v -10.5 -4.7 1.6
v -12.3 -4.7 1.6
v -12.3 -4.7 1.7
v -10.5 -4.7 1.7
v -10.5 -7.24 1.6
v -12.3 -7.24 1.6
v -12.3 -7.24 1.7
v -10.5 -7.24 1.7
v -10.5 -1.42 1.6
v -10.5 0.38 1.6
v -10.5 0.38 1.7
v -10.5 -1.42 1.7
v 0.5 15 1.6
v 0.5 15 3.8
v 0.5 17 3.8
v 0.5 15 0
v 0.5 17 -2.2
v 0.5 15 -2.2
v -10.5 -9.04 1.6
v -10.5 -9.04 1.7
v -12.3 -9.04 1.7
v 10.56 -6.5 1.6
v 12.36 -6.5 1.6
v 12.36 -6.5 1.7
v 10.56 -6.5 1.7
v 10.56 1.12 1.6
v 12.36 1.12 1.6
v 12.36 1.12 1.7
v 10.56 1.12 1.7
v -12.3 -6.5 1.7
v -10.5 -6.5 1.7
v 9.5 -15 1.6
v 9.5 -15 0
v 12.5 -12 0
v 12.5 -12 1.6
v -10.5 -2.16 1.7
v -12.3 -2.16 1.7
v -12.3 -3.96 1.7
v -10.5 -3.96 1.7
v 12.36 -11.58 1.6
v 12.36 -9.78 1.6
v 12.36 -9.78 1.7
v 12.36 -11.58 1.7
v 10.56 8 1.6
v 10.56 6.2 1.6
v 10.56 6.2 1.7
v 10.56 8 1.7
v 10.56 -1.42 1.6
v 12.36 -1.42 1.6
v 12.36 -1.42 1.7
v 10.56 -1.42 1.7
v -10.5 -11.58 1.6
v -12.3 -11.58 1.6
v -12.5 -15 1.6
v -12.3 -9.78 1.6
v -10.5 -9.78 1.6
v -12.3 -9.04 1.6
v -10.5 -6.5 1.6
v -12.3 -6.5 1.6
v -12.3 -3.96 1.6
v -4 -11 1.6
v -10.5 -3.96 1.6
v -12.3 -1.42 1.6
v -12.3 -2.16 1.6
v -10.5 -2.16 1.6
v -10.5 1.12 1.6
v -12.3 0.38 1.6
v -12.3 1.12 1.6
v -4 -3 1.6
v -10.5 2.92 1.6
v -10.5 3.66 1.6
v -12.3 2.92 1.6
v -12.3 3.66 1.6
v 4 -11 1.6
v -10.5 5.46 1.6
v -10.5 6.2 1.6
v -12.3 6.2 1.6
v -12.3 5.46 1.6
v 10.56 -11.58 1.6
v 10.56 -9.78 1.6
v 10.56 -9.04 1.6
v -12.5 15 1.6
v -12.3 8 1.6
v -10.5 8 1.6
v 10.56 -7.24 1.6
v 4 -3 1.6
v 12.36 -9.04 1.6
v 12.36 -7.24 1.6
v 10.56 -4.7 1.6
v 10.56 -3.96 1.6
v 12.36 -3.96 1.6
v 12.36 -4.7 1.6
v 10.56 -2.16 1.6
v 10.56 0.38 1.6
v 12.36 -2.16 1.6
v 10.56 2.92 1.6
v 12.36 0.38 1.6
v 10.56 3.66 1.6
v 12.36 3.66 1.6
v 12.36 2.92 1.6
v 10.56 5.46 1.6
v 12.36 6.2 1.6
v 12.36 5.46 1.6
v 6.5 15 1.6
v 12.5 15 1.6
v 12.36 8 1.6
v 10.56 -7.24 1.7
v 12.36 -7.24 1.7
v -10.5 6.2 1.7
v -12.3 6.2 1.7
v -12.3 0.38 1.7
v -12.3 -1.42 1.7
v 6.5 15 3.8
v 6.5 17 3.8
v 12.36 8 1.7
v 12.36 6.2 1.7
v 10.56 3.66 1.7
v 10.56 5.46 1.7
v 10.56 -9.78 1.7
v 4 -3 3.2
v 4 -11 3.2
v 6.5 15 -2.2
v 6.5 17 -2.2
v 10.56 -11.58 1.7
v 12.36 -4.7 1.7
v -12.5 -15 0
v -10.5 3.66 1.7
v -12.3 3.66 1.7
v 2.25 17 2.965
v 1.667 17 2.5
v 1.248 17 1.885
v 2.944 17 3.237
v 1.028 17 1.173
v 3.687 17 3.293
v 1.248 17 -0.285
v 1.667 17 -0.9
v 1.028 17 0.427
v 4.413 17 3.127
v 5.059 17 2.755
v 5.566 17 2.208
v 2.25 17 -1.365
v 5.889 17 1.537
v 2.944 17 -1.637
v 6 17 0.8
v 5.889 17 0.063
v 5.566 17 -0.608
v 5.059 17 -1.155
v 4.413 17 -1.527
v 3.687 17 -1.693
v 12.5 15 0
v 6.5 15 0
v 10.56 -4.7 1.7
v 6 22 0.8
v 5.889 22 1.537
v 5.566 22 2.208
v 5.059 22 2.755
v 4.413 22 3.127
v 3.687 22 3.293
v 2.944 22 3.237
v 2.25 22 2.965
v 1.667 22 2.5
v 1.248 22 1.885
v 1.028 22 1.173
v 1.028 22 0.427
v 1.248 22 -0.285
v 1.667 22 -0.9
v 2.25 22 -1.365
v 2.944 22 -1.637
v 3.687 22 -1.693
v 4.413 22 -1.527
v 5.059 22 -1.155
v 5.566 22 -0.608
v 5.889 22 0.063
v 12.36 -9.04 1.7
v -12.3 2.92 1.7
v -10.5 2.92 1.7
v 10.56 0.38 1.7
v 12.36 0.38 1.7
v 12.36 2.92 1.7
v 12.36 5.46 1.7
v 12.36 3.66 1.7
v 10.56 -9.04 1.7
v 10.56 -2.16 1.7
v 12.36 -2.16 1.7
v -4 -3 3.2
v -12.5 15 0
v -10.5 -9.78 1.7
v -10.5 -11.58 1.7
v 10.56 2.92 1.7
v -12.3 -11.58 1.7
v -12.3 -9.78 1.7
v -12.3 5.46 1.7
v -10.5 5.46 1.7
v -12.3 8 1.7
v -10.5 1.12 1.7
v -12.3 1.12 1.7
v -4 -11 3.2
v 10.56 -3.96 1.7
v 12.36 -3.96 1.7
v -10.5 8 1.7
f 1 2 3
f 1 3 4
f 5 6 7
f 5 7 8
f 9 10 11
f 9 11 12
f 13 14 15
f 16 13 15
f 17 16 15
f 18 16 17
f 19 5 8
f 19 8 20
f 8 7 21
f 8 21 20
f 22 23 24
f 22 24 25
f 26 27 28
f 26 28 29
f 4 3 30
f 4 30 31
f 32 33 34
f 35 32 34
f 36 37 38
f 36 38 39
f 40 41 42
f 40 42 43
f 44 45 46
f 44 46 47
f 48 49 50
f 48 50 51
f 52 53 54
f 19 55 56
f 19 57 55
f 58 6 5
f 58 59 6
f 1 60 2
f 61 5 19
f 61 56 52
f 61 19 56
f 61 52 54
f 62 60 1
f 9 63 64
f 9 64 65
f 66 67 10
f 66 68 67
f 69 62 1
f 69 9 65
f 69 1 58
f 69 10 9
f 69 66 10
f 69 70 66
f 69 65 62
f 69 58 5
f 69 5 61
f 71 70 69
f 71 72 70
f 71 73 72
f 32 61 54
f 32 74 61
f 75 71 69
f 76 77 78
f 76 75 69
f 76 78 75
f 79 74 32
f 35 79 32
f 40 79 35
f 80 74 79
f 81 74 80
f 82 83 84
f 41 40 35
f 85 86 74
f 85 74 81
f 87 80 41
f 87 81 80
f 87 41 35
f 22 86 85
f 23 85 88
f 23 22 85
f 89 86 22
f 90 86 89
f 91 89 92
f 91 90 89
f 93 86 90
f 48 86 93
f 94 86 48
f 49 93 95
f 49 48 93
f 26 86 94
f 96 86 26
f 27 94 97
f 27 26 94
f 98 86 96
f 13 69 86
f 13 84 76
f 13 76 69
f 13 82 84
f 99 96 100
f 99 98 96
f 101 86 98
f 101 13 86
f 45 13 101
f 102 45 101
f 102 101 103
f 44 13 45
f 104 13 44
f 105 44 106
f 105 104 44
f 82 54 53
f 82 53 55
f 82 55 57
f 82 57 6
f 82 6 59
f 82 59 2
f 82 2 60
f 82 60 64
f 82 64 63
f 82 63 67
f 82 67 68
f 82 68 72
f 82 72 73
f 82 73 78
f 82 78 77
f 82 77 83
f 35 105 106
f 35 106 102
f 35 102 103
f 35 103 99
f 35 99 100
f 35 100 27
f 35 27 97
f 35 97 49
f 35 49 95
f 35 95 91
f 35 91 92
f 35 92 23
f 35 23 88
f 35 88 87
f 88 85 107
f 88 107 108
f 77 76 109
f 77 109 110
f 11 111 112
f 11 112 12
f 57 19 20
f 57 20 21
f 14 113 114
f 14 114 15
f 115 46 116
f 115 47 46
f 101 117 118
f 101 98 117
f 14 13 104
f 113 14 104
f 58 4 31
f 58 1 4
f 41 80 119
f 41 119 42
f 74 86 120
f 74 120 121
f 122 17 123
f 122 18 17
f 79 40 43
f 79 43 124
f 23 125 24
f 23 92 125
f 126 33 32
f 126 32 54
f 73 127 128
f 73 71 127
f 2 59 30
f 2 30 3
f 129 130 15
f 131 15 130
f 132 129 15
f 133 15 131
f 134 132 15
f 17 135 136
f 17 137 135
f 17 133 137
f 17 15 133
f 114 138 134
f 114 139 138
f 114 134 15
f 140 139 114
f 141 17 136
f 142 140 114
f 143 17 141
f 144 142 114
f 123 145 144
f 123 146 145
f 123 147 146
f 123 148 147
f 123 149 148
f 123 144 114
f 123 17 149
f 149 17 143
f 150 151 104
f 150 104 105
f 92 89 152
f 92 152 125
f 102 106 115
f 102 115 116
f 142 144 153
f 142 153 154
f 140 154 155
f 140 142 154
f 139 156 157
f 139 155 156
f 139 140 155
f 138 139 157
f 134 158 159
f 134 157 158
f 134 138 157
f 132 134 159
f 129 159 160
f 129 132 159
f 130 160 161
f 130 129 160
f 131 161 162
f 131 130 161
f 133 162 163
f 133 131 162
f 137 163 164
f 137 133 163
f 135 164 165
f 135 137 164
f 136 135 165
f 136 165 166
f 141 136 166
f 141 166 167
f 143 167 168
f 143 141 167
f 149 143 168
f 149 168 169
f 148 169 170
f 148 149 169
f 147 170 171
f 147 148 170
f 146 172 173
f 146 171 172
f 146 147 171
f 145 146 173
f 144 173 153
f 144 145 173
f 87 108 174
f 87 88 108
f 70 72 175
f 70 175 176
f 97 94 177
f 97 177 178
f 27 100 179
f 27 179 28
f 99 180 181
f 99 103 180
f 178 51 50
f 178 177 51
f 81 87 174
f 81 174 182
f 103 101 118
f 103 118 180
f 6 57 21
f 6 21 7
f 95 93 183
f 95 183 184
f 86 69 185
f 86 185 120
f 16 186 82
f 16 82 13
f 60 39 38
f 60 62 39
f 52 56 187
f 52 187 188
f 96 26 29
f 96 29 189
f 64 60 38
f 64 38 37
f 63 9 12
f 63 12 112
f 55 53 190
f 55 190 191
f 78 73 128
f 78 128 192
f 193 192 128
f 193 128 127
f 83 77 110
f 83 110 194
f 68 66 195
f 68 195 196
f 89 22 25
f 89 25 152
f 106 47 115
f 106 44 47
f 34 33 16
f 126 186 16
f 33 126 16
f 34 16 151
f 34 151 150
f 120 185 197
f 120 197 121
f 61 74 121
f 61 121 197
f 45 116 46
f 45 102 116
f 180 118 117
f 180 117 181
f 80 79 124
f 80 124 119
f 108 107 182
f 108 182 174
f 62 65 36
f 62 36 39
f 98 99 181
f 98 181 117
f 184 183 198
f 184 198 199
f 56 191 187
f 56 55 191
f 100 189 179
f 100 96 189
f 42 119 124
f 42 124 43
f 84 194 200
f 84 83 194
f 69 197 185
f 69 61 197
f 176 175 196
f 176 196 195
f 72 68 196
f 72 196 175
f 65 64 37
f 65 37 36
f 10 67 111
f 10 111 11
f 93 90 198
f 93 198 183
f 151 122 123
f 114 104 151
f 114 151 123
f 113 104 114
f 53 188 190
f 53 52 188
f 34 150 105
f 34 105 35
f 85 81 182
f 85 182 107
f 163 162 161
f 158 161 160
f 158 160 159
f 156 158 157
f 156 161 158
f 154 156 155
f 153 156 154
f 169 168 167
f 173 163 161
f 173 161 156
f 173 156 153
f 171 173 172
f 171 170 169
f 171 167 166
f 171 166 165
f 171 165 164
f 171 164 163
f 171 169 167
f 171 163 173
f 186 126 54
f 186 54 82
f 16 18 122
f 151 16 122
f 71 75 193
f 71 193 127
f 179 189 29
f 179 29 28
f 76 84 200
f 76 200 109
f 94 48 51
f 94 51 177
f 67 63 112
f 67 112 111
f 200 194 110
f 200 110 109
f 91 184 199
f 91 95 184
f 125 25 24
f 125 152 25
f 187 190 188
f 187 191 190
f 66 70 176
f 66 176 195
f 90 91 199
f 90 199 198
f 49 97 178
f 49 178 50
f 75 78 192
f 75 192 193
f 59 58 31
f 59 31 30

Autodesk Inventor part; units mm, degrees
ref_plane "YZ Plane" through (0, 0, 0) normal (1, 0, 0) x (0, 1, 0)
ref_plane "XZ Plane" through (0, 0, 0) normal (0, 1, 0) x (-1, 0, 0)
ref_plane "XY Plane" through (0, 0, 0) normal (0, 0, 1) x (1, 0, 0)
sketch "Sketch1" plane through (0, 0, 0) normal (0, 0, 1) x (1, 0, 0)
  line L0 (-12.5, 15) -> (12.5, 15)
  line L1 (12.5, 15) -> (12.5, -12)
  line L2 (9.5, -15) -> (-12.5, -15)
  line L3 (-12.5, -15) -> (-12.5, 15)
  line L4 (-12.5, 15) -> (12.5, -15) construction
  line L5 (12.5, 15) -> (-12.5, -15) construction
  line L6 (9.5, -15) -> (12.5, -12)
  point P0 (0, 0)
  dimension "d0" = 25
  dimension "d1" = 30
  dimension "d2" = 3
  dimension "d3" = 3
extrude "Extrusion1" add sketch "Sketch1" along normal blind 1.6
sketch "Sketch2" plane through (0, 0, 1.6) normal (0, 0, 1) x (1, 0, 0)
  line L0 (-4, -3) -> (4, -3)
  line L1 (4, -3) -> (4, -11)
  line L2 (4, -11) -> (-4, -11)
  line L3 (-4, -11) -> (-4, -3)
  line L4 (-4, -3) -> (4, -11) construction
  line L5 (4, -3) -> (-4, -11) construction
  line L6 (-12.5, -15) -> (9.5, -15) projected
  point P0 (0, 0)
  point P1 (0, -7)
  dimension "d6" = 8
  dimension "d7" = 8
  dimension "d8" = 8
extrude "Extrusion2" add sketch "Sketch2" along normal blind 1.6
sketch "Sketch5" plane through (0, 0, 1.6) normal (0, 0, 1) x (1, 0, 0)
  line L0 (-12.3, 8) -> (-10.5, 8)
  line L1 (-10.5, 8) -> (-10.5, 6.2)
  line L2 (-10.5, 6.2) -> (-12.3, 6.2)
  line L3 (-12.3, 6.2) -> (-12.3, 8)
  line L4 (-12.3, 8) -> (-10.5, 6.2) construction
  line L5 (-10.5, 8) -> (-12.3, 6.2) construction
  line L6 (-12.5, 15) -> (-12.5, -15) projected
  line L7 (-12.3, 3.66) -> (-12.3, 5.46)
  line L8 (-12.3, 5.46) -> (-10.5, 5.46)
  line L9 (-10.5, 5.46) -> (-10.5, 3.66)
  line L10 (-10.5, 3.66) -> (-12.3, 3.66)
  line L11 (-12.3, 1.12) -> (-12.3, 2.92)
  line L12 (-12.3, 2.92) -> (-10.5, 2.92)
  line L13 (-10.5, 2.92) -> (-10.5, 1.12)
  line L14 (-10.5, 1.12) -> (-12.3, 1.12)
  line L15 (-12.3, -1.42) -> (-12.3, 0.38)
  line L16 (-12.3, 0.38) -> (-10.5, 0.38)
  line L17 (-10.5, 0.38) -> (-10.5, -1.42)
  line L18 (-10.5, -1.42) -> (-12.3, -1.42)
  line L19 (-12.3, -3.96) -> (-12.3, -2.16)
  line L20 (-12.3, -2.16) -> (-10.5, -2.16)
  line L21 (-10.5, -2.16) -> (-10.5, -3.96)
  line L22 (-10.5, -3.96) -> (-12.3, -3.96)
  line L23 (-12.3, -6.5) -> (-12.3, -4.7)
  line L24 (-12.3, -4.7) -> (-10.5, -4.7)
  line L25 (-10.5, -4.7) -> (-10.5, -6.5)
  line L26 (-10.5, -6.5) -> (-12.3, -6.5)
  line L27 (-12.3, -9.04) -> (-12.3, -7.24)
  line L28 (-12.3, -7.24) -> (-10.5, -7.24)
  line L29 (-10.5, -7.24) -> (-10.5, -9.04)
  line L30 (-10.5, -9.04) -> (-12.3, -9.04)
  line L31 (-12.3, -11.58) -> (-12.3, -9.78)
  line L32 (-12.3, -9.78) -> (-10.5, -9.78)
  line L33 (-10.5, -9.78) -> (-10.5, -11.58)
  line L34 (-10.5, -11.58) -> (-12.3, -11.58)
  line L35 (12.5, 15) -> (-12.5, 15) projected
  line L36 (10.56, 6.2) -> (10.56, 8)
  line L37 (10.56, 8) -> (12.36, 8)
  line L38 (12.36, 8) -> (12.36, 6.2)
  line L39 (12.36, 6.2) -> (10.56, 6.2)
  line L40 (10.56, 3.66) -> (10.56, 5.46)
  line L41 (10.56, 5.46) -> (12.36, 5.46)
  line L42 (12.36, 5.46) -> (12.36, 3.66)
  line L43 (12.36, 3.66) -> (10.56, 3.66)
  line L44 (10.56, 1.12) -> (10.56, 2.92)
  line L45 (10.56, 2.92) -> (12.36, 2.92)
  line L46 (12.36, 2.92) -> (12.36, 1.12)
  line L47 (12.36, 1.12) -> (10.56, 1.12)
  line L48 (10.56, -1.42) -> (10.56, 0.38)
  line L49 (10.56, 0.38) -> (12.36, 0.38)
  line L50 (12.36, 0.38) -> (12.36, -1.42)
  line L51 (12.36, -1.42) -> (10.56, -1.42)
  line L52 (10.56, -3.96) -> (10.56, -2.16)
  line L53 (10.56, -2.16) -> (12.36, -2.16)
  line L54 (12.36, -2.16) -> (12.36, -3.96)
  line L55 (12.36, -3.96) -> (10.56, -3.96)
  line L56 (10.56, -6.5) -> (10.56, -4.7)
  line L57 (10.56, -4.7) -> (12.36, -4.7)
  line L58 (12.36, -4.7) -> (12.36, -6.5)
  line L59 (12.36, -6.5) -> (10.56, -6.5)
  line L60 (10.56, -9.04) -> (10.56, -7.24)
  line L61 (10.56, -7.24) -> (12.36, -7.24)
  line L62 (12.36, -7.24) -> (12.36, -9.04)
  line L63 (12.36, -9.04) -> (10.56, -9.04)
  line L64 (10.56, -11.58) -> (10.56, -9.78)
  line L65 (10.56, -9.78) -> (12.36, -9.78)
  line L66 (12.36, -9.78) -> (12.36, -11.58)
  line L67 (12.36, -11.58) -> (10.56, -11.58)
  point P0 (0, 0)
  point P1 (-11.4, 7.1)
  point P2 (2, 15)
  dimension "d19" = 1.8
  dimension "d20" = 1.8
  dimension "d21" = 1.1
  dimension "d24" = 2.54
  dimension "d29" = 7
  dimension "d32" = 22.86
extrude "Extrusion5" add sketch "Sketch5" along normal blind 0.1
sketch "Sketch6" plane through (-12.5, 15, 0) normal (0, 1, 0) x (1, 0, 0)
  line L0 (19, -3.8) -> (13, -3.8)
  line L1 (13, -3.8) -> (13, 2.2)
  line L2 (13, 2.2) -> (19, 2.2)
  line L3 (19, 2.2) -> (19, -3.8)
  line L4 (19, -3.8) -> (13, 2.2) construction
  line L5 (13, -3.8) -> (19, 2.2) construction
  line L6 (25, 0) -> (25, -1.6) projected
  point P0 (12.5, 0)
  point P1 (16, -0.8)
  point P2 (25, -0.8)
  dimension "d39" = 6
  dimension "d40" = 6
  dimension "d41" = 6
extrude "Extrusion6" add sketch "Sketch6" along normal blind 2
sketch "Sketch7" plane through (-12.5, 17, 0) normal (0, 1, 0) x (1, 0, 0)
  circle A0 centre (16, -0.8) radius 2.5
  line L0 (13, -3.8) -> (19, -3.8) projected
  line L1 (13, 2.2) -> (13, -3.8) projected
  point P0 (12.5, 0)
  point P1 (16, -3.8)
  point P2 (13, -0.8)
  dimension "d44" = 5
extrude "Extrusion7" add sketch "Sketch7" along normal blind 5
equation "\"d3\" = d2"
properties part number "GNSS_board" material "ABS Plastic"
